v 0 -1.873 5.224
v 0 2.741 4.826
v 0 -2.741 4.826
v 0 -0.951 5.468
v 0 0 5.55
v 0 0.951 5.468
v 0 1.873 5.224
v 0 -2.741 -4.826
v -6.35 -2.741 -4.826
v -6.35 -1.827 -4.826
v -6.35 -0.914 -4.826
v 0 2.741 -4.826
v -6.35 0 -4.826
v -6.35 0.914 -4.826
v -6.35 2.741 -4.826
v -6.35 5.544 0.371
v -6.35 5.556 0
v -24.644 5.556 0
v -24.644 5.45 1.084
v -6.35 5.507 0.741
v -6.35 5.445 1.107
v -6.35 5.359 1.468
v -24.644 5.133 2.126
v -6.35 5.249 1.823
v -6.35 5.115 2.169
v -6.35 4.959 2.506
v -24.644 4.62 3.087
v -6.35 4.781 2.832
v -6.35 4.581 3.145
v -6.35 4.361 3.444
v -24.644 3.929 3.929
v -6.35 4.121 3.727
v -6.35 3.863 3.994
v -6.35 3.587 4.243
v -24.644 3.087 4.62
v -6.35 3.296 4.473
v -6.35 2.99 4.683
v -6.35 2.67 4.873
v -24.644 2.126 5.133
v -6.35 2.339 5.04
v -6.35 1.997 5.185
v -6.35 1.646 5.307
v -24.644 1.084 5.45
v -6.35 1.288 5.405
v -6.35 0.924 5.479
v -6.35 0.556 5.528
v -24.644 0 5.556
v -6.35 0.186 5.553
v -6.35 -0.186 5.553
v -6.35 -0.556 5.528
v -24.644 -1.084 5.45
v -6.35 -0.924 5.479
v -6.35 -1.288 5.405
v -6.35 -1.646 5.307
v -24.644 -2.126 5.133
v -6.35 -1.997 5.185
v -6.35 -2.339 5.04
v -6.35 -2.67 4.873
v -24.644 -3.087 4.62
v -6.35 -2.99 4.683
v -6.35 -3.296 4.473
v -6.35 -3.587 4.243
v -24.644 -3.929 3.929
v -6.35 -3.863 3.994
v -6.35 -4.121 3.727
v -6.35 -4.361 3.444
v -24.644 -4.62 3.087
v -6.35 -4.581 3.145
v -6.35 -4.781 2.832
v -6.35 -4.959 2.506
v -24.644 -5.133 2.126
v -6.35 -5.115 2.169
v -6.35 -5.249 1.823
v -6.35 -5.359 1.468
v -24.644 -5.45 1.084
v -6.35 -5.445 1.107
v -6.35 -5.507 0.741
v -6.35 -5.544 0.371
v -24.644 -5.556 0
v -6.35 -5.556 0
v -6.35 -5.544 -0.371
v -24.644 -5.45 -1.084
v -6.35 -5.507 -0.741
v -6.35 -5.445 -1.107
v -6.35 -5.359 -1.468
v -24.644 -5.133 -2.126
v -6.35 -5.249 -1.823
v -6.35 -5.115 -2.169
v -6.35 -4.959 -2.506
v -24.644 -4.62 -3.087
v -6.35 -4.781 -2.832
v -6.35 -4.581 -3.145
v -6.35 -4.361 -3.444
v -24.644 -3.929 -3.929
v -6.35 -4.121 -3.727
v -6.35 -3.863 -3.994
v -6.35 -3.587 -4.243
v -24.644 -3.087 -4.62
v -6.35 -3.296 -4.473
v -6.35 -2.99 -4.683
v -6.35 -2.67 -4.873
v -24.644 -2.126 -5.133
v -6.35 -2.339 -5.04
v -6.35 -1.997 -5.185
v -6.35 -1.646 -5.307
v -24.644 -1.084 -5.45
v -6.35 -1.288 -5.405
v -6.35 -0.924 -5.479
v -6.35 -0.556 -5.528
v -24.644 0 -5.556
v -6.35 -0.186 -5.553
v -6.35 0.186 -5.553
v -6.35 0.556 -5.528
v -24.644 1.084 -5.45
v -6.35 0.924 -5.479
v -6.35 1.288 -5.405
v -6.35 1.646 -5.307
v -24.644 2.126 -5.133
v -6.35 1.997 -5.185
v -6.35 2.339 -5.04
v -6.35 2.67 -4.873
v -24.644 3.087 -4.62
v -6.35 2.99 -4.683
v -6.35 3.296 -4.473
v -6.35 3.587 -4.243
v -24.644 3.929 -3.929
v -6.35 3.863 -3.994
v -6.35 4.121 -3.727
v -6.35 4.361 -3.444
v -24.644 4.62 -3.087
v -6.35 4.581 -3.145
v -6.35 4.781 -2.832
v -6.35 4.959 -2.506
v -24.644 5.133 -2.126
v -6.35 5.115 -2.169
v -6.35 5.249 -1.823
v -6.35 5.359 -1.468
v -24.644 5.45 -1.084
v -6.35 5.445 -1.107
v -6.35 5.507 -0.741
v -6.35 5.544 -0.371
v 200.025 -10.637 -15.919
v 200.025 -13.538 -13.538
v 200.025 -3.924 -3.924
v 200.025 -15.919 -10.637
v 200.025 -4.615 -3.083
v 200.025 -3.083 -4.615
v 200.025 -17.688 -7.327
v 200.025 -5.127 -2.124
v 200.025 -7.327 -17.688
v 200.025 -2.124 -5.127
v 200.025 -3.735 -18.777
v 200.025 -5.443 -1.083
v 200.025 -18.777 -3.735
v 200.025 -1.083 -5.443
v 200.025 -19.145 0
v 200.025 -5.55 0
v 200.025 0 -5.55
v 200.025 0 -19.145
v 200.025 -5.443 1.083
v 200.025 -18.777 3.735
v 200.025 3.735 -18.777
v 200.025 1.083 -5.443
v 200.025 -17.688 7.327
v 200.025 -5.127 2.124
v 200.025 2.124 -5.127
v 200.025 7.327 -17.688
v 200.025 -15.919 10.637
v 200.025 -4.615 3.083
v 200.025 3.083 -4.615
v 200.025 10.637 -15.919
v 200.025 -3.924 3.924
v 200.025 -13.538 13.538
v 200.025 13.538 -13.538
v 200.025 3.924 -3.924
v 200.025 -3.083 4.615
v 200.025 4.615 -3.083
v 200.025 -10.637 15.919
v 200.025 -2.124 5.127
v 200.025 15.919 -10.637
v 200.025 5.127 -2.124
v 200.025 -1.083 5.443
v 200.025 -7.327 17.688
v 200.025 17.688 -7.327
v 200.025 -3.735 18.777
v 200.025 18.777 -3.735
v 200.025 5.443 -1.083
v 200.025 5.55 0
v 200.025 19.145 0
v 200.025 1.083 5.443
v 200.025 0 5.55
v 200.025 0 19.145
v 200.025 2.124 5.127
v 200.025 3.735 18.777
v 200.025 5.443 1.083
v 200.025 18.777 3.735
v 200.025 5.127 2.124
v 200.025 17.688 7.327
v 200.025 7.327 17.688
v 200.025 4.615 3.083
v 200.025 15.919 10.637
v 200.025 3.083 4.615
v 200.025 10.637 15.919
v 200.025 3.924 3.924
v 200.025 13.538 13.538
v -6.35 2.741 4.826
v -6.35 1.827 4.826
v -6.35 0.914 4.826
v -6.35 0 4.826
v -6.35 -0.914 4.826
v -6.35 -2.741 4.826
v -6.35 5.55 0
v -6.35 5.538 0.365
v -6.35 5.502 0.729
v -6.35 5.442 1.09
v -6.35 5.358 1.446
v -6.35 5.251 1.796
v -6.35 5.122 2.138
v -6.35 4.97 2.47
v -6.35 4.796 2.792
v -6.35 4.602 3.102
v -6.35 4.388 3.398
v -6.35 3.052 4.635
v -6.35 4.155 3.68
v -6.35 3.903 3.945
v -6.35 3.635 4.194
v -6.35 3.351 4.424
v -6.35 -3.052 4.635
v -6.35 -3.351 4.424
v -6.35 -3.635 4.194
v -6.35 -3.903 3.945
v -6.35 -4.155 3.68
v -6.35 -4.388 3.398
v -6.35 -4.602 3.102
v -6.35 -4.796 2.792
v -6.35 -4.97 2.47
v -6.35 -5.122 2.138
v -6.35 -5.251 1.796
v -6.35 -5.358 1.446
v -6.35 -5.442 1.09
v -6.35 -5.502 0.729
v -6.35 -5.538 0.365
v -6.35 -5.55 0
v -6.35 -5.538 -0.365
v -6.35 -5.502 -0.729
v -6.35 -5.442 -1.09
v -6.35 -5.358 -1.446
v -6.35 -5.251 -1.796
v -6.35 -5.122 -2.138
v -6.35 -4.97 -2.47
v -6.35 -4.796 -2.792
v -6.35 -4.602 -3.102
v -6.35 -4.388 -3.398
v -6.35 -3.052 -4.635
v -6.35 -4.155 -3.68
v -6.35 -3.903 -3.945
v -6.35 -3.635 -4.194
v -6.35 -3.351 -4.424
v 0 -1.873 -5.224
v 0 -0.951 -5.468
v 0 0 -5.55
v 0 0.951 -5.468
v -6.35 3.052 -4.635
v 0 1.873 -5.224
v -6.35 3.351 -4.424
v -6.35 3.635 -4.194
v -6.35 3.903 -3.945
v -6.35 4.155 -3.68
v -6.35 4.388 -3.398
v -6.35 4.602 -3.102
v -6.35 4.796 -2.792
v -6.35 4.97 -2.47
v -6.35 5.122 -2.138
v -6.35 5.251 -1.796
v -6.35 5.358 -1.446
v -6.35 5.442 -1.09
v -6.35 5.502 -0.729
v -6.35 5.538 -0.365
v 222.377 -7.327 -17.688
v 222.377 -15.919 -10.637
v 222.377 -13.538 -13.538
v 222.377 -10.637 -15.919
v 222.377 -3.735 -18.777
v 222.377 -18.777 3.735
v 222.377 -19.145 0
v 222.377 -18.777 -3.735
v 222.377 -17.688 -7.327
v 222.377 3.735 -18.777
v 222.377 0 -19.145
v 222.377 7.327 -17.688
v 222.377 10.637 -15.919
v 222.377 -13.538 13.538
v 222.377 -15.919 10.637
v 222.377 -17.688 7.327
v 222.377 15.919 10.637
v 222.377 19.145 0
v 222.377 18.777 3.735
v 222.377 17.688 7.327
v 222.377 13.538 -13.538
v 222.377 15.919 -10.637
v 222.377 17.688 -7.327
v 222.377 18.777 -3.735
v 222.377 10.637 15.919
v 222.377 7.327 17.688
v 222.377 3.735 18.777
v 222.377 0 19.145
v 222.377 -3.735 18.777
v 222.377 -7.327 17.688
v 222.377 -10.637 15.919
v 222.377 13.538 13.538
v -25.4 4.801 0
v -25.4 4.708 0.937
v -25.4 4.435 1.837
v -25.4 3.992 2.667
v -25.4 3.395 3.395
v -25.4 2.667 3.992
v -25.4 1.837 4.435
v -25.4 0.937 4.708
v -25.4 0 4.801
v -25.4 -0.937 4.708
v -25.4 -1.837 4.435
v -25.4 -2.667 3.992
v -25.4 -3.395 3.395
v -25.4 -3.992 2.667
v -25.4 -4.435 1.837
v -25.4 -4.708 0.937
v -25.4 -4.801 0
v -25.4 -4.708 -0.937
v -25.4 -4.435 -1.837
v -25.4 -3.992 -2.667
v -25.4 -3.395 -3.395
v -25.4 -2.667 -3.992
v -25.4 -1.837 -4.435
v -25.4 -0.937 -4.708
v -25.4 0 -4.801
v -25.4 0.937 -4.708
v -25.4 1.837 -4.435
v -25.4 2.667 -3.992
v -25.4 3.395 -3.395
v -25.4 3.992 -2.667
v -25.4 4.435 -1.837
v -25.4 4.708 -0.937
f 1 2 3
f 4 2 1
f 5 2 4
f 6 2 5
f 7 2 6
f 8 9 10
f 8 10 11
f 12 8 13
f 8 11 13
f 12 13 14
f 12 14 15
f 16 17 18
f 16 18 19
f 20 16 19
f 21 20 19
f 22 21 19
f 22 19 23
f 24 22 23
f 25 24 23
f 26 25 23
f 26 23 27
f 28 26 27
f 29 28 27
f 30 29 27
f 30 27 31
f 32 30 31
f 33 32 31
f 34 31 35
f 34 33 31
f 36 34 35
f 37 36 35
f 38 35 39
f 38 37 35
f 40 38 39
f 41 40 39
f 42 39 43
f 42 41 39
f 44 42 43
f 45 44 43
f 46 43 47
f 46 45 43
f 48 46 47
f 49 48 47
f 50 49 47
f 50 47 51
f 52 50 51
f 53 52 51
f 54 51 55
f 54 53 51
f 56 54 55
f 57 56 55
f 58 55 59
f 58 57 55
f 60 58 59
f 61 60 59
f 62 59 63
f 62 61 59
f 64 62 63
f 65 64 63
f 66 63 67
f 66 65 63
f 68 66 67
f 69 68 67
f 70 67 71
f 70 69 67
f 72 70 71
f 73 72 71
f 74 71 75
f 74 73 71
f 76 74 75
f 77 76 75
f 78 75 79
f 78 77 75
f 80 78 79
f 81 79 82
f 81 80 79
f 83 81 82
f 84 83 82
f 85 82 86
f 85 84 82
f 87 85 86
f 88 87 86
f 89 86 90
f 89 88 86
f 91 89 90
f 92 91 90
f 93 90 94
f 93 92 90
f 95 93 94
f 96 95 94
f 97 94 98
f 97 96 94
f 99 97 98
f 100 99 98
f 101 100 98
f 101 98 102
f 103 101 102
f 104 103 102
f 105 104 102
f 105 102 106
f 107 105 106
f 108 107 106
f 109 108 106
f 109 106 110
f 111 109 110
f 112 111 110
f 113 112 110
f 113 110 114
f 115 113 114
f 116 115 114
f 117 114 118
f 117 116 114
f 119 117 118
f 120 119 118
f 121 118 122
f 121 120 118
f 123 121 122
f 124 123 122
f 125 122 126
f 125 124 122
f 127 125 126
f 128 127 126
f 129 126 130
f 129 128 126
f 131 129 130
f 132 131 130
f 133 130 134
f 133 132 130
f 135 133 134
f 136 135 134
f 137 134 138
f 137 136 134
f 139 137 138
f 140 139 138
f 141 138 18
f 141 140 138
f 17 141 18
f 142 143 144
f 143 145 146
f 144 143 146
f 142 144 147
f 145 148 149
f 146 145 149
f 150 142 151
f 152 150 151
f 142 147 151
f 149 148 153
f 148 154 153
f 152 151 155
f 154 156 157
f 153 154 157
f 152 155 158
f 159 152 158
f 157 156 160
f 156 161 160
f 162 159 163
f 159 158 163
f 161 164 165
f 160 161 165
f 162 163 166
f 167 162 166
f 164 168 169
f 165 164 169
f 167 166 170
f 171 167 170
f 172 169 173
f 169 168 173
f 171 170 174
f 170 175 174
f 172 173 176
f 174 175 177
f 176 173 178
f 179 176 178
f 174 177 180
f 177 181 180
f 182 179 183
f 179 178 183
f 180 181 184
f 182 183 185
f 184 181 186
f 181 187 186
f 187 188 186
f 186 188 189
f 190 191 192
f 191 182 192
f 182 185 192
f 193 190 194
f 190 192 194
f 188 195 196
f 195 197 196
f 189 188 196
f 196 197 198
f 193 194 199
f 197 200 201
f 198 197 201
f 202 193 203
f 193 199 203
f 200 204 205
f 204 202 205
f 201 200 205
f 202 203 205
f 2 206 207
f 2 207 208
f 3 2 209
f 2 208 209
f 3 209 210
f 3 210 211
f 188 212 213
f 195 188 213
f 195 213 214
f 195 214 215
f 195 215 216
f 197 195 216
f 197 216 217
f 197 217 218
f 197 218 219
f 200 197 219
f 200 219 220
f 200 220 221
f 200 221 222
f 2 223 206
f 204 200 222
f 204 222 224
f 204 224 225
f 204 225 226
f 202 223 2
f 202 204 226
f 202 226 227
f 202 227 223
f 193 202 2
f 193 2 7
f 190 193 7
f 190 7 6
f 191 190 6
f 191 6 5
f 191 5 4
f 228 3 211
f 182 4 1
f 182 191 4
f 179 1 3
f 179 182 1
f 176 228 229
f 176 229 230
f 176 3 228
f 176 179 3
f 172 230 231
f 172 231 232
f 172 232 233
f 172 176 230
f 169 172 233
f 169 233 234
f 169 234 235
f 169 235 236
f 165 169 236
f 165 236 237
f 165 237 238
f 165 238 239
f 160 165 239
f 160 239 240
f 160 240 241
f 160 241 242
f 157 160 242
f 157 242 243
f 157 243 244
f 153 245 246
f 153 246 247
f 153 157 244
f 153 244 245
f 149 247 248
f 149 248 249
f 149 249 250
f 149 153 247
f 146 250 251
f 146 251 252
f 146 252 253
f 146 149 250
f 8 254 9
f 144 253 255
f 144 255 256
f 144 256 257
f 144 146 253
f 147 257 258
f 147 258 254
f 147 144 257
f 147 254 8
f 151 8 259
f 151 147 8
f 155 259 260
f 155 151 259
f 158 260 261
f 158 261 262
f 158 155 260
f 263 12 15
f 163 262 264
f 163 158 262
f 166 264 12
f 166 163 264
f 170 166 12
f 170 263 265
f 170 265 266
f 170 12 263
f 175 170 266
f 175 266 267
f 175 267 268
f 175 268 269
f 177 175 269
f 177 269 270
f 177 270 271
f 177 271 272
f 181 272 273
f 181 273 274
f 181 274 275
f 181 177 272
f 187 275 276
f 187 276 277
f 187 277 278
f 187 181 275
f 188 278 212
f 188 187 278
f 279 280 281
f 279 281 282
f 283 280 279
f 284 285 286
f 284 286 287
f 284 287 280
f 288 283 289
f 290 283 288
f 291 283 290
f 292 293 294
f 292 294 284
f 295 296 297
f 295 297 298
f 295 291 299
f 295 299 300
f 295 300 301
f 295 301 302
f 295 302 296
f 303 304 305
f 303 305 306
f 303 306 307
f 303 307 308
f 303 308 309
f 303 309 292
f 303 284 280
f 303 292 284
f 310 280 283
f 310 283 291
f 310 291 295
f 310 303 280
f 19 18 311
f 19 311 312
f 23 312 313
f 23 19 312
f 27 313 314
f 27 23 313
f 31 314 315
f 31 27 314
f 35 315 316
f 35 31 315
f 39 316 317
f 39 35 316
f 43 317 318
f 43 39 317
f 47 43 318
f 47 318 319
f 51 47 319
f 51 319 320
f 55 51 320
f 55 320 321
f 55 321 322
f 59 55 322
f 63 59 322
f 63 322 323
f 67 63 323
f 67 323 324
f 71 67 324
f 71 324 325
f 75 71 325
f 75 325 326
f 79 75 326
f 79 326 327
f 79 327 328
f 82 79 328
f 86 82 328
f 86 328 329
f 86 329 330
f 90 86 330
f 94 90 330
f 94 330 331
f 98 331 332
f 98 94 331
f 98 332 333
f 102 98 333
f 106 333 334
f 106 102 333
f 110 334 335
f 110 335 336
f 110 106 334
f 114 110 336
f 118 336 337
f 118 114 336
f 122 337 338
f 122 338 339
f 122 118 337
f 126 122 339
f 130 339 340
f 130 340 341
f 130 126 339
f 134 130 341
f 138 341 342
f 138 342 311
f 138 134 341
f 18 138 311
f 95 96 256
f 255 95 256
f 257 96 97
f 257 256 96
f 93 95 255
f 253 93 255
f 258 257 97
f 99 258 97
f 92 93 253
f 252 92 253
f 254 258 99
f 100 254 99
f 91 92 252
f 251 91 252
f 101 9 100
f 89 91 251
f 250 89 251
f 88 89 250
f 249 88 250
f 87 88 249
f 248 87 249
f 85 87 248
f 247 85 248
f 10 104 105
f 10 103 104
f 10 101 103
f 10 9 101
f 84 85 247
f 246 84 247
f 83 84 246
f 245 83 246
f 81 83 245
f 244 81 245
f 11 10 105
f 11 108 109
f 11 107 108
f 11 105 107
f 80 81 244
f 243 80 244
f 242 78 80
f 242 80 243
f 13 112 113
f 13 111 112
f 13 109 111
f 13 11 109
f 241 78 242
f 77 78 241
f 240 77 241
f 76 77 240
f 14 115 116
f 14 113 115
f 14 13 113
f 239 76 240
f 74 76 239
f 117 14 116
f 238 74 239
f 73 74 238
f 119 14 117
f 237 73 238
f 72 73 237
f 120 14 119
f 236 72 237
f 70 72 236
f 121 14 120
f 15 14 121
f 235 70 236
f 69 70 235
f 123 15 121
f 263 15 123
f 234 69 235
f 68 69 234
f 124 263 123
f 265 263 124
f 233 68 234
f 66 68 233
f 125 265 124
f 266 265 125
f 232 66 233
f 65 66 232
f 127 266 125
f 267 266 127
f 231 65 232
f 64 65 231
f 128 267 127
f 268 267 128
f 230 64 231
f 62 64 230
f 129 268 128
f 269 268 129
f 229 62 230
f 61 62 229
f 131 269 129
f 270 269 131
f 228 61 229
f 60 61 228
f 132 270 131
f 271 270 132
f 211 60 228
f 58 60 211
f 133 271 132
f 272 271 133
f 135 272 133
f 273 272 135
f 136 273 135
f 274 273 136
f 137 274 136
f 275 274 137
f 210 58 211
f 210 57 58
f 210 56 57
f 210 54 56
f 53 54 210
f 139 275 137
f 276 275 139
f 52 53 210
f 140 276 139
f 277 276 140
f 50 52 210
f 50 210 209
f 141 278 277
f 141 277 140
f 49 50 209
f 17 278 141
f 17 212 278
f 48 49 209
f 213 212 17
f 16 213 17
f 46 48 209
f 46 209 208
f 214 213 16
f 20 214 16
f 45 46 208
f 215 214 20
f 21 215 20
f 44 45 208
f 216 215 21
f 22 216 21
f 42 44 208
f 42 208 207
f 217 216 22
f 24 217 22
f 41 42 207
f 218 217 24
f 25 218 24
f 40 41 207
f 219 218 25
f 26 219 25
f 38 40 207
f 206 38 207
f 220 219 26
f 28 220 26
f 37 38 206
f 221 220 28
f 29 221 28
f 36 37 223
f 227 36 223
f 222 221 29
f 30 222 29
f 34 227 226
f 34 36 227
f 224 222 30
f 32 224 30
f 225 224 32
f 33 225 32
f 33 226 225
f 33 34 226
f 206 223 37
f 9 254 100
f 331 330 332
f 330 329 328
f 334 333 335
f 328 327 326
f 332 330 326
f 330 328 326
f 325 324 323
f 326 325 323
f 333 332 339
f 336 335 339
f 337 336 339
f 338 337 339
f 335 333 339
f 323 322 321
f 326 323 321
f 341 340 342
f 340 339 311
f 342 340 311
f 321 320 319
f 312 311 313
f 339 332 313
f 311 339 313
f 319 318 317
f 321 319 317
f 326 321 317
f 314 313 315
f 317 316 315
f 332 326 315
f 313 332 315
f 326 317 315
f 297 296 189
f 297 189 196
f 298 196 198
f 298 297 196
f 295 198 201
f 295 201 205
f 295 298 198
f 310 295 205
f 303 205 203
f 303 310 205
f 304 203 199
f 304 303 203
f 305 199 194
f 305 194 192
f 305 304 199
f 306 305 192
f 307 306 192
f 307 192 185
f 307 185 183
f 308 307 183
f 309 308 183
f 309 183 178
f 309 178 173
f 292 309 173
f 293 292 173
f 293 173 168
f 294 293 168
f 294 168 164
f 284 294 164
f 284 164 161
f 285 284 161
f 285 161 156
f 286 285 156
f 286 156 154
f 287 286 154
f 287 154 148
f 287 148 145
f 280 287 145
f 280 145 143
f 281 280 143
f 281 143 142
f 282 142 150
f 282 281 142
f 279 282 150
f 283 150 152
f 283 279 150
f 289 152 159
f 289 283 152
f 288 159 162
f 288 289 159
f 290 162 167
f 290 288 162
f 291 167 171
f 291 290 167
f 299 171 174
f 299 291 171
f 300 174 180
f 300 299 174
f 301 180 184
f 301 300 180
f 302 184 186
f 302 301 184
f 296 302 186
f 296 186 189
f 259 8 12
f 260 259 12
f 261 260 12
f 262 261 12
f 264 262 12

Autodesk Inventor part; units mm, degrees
sketch "Sketch_1" plane through (0, 0, 0) normal (0, 0, 1) x (1, 0, 0)
  line L0 (222.377, 0) -> (-6.35, 0)
  line L1 (-6.35, 0) -> (-6.35, 5.5499)
  line L2 (-6.35, 5.5499) -> (200.025, 5.5499)
  line L3 (200.025, 5.5499) -> (200.025, 19.1453)
  line L4 (200.025, 19.1453) -> (222.377, 19.1453)
  line L5 (222.377, 19.1453) -> (222.377, 0)
  line L6 (222.377, 0) -> (-6.35, 0)
revolve "Revolution1" add sketch "Sketch_1" angle 360 about axis through (222.377, 0, 0) along (1, 0, 0)
sketch "Sketch_3" plane through (0, 0, 0) normal (0, 0, 1) x (1, 0, 0)
  line L0 (-6.35, 0) -> (-25.4, 0)
  line L1 (-25.4, 0) -> (-25.4, 4.8006)
  line L2 (-25.4, 4.8006) -> (-24.6443, 5.5563)
  line L3 (-24.6443, 5.5563) -> (-6.35, 5.5563)
  line L4 (-6.35, 5.5563) -> (-6.35, 0)
  line L5 (-6.35, 0) -> (-25.4, 0)
revolve "Revolution2" add sketch "Sketch_3" angle 360 about axis through (-6.35, 0, 0) along (1, 0, 0)
thread "Thread1" size "7/16-20 UNF" class "2A" standard "ANSI Unified Screw Threads" full length
sketch "Sketch_10" plane through (-6.35, 0, 0) normal (1, 0, 0) x (0, 0, -1)
  line L0 (-11.0998, -11.0998) -> (11.0998, -11.0998)
  line L1 (11.0998, -11.0998) -> (11.0998, 11.0998)
  line L2 (11.0998, 11.0998) -> (-11.0998, 11.0998)
  line L3 (-11.0998, 11.0998) -> (-11.0998, -11.0998)
  line L4 (-4.826, -5.5499) -> (4.826, -5.5499)
  line L5 (4.826, -5.5499) -> (4.826, 5.5499)
  line L6 (4.826, 5.5499) -> (-4.826, 5.5499)
  line L7 (-4.826, 5.5499) -> (-4.826, -5.5499)
extrude "Extrusion1" cut sketch "Sketch_10" along normal blind 6.35
ref_plane "dia1_XY" through (-6.35, 5.5499, 0) normal (1, 0, 0) x (0, 0, -1)
ref_plane "dia1_YZ" through (-6.35, 5.5499, 0) normal (0, 0, -1) x (0, 1, 0)
ref_plane "dia1_ZX" through (-6.35, 5.5499, 0) normal (0, 1, 0) x (1, 0, 0)
ref_plane "dia12_XY" through (0, 0, 19.7675) normal (1, 0, 0) x (0, 0, -1)
ref_plane "dia12_YZ" through (0, 0, 19.7675) normal (0, 0, -1) x (0, 1, 0)
ref_plane "dia12_ZX" through (0, 0, 19.7675) normal (0, 1, 0) x (1, 0, 0)
ref_plane "dia2_XY" through (-6.35, -5.5499, 0) normal (1, 0, 0) x (0, 0, -1)
ref_plane "dia2_YZ" through (-6.35, -5.5499, 0) normal (0, 0, -1) x (0, 1, 0)
ref_plane "dia2_ZX" through (-6.35, -5.5499, 0) normal (0, 1, 0) x (1, 0, 0)
ref_plane "dia22_XY" through (0, 0, -19.7675) normal (1, 0, 0) x (0, 0, -1)
ref_plane "dia22_YZ" through (0, 0, -19.7675) normal (0, 0, -1) x (0, 1, 0)
ref_plane "dia22_ZX" through (0, 0, -19.7675) normal (0, 1, 0) x (1, 0, 0)
ref_plane "rl1_XY" through (-25.4, 0, 0) normal (1, 0, 0) x (0, 0, -1)
ref_plane "rl1_YZ" through (-25.4, 0, 0) normal (0, 0, -1) x (0, 1, 0)
ref_plane "rl1_ZX" through (-25.4, 0, 0) normal (0, 1, 0) x (1, 0, 0)
ref_plane "rl2_XY" through (-6.35, 0, 0) normal (1, 0, 0) x (0, 0, -1)
ref_plane "rl2_YZ" through (-6.35, 0, 0) normal (0, 0, -1) x (0, 1, 0)
ref_plane "rl2_ZX" through (-6.35, 0, 0) normal (0, 1, 0) x (1, 0, 0)
ref_plane "rod_cp_XY" through (0, 0, 0) normal (1, 0, 0) x (0, 0, -1)
ref_plane "rod_cp_YZ" through (0, 0, 0) normal (0, 0, -1) x (0, 1, 0)
ref_plane "rod_cp_ZX" through (0, 0, 0) normal (0, 1, 0) x (1, 0, 0)
ref_plane "thd1_XY" through (-25.4, 5.5563, 0) normal (1, 0, 0) x (0, 0, -1)
ref_plane "thd1_YZ" through (-25.4, 5.5563, 0) normal (0, 0, -1) x (0, 1, 0)
ref_plane "thd1_ZX" through (-25.4, 5.5563, 0) normal (0, 1, 0) x (1, 0, 0)
ref_plane "thd2_XY" through (-25.4, -5.5563, 0) normal (1, 0, 0) x (0, 0, -1)
ref_plane "thd2_YZ" through (-25.4, -5.5563, 0) normal (0, 0, -1) x (0, 1, 0)
ref_plane "thd2_ZX" through (-25.4, -5.5563, 0) normal (0, 1, 0) x (1, 0, 0)
ref_plane "to_rod_clevis_XY" through (-30.988, 0, 0) normal (1, 0, 0) x (0, 0, -1)
ref_plane "to_rod_clevis_YZ" through (-30.988, 0, 0) normal (0, 0, -1) x (0, 1, 0)
ref_plane "to_rod_clevis_ZX" through (-30.988, 0, 0) normal (0, 1, 0) x (1, 0, 0)
ref_plane "wf1_XY" through (-6.35, 0, 0) normal (1, 0, 0) x (0, 0, -1)
ref_plane "wf1_YZ" through (-6.35, 0, 0) normal (0, 0, -1) x (0, 1, 0)
ref_plane "wf1_ZX" through (-6.35, 0, 0) normal (0, 1, 0) x (1, 0, 0)
ref_plane "wf2_XY" through (0, 0, 0) normal (1, 0, 0) x (0, 0, -1)
ref_plane "wf2_YZ" through (0, 0, 0) normal (0, 0, -1) x (0, 1, 0)
ref_plane "wf2_ZX" through (0, 0, 0) normal (0, 1, 0) x (1, 0, 0)
ref_plane "wfw1_XY" through (-6.35, 0, -4.826) normal (0, 1, 0) x (1, 0, 0)
ref_plane "wfw1_YZ" through (-6.35, 0, -4.826) normal (1, 0, 0) x (0, 0, -1)
ref_plane "wfw1_ZX" through (-6.35, 0, -4.826) normal (0, 0, -1) x (0, 1, 0)
ref_plane "wfw2_XY" through (-6.35, 0, 4.826) normal (0, 1, 0) x (1, 0, 0)
ref_plane "wfw2_YZ" through (-6.35, 0, 4.826) normal (1, 0, 0) x (0, 0, -1)
ref_plane "wfw2_ZX" through (-6.35, 0, 4.826) normal (0, 0, -1) x (0, 1, 0)
properties part number "C-176-DP0000_rod"
